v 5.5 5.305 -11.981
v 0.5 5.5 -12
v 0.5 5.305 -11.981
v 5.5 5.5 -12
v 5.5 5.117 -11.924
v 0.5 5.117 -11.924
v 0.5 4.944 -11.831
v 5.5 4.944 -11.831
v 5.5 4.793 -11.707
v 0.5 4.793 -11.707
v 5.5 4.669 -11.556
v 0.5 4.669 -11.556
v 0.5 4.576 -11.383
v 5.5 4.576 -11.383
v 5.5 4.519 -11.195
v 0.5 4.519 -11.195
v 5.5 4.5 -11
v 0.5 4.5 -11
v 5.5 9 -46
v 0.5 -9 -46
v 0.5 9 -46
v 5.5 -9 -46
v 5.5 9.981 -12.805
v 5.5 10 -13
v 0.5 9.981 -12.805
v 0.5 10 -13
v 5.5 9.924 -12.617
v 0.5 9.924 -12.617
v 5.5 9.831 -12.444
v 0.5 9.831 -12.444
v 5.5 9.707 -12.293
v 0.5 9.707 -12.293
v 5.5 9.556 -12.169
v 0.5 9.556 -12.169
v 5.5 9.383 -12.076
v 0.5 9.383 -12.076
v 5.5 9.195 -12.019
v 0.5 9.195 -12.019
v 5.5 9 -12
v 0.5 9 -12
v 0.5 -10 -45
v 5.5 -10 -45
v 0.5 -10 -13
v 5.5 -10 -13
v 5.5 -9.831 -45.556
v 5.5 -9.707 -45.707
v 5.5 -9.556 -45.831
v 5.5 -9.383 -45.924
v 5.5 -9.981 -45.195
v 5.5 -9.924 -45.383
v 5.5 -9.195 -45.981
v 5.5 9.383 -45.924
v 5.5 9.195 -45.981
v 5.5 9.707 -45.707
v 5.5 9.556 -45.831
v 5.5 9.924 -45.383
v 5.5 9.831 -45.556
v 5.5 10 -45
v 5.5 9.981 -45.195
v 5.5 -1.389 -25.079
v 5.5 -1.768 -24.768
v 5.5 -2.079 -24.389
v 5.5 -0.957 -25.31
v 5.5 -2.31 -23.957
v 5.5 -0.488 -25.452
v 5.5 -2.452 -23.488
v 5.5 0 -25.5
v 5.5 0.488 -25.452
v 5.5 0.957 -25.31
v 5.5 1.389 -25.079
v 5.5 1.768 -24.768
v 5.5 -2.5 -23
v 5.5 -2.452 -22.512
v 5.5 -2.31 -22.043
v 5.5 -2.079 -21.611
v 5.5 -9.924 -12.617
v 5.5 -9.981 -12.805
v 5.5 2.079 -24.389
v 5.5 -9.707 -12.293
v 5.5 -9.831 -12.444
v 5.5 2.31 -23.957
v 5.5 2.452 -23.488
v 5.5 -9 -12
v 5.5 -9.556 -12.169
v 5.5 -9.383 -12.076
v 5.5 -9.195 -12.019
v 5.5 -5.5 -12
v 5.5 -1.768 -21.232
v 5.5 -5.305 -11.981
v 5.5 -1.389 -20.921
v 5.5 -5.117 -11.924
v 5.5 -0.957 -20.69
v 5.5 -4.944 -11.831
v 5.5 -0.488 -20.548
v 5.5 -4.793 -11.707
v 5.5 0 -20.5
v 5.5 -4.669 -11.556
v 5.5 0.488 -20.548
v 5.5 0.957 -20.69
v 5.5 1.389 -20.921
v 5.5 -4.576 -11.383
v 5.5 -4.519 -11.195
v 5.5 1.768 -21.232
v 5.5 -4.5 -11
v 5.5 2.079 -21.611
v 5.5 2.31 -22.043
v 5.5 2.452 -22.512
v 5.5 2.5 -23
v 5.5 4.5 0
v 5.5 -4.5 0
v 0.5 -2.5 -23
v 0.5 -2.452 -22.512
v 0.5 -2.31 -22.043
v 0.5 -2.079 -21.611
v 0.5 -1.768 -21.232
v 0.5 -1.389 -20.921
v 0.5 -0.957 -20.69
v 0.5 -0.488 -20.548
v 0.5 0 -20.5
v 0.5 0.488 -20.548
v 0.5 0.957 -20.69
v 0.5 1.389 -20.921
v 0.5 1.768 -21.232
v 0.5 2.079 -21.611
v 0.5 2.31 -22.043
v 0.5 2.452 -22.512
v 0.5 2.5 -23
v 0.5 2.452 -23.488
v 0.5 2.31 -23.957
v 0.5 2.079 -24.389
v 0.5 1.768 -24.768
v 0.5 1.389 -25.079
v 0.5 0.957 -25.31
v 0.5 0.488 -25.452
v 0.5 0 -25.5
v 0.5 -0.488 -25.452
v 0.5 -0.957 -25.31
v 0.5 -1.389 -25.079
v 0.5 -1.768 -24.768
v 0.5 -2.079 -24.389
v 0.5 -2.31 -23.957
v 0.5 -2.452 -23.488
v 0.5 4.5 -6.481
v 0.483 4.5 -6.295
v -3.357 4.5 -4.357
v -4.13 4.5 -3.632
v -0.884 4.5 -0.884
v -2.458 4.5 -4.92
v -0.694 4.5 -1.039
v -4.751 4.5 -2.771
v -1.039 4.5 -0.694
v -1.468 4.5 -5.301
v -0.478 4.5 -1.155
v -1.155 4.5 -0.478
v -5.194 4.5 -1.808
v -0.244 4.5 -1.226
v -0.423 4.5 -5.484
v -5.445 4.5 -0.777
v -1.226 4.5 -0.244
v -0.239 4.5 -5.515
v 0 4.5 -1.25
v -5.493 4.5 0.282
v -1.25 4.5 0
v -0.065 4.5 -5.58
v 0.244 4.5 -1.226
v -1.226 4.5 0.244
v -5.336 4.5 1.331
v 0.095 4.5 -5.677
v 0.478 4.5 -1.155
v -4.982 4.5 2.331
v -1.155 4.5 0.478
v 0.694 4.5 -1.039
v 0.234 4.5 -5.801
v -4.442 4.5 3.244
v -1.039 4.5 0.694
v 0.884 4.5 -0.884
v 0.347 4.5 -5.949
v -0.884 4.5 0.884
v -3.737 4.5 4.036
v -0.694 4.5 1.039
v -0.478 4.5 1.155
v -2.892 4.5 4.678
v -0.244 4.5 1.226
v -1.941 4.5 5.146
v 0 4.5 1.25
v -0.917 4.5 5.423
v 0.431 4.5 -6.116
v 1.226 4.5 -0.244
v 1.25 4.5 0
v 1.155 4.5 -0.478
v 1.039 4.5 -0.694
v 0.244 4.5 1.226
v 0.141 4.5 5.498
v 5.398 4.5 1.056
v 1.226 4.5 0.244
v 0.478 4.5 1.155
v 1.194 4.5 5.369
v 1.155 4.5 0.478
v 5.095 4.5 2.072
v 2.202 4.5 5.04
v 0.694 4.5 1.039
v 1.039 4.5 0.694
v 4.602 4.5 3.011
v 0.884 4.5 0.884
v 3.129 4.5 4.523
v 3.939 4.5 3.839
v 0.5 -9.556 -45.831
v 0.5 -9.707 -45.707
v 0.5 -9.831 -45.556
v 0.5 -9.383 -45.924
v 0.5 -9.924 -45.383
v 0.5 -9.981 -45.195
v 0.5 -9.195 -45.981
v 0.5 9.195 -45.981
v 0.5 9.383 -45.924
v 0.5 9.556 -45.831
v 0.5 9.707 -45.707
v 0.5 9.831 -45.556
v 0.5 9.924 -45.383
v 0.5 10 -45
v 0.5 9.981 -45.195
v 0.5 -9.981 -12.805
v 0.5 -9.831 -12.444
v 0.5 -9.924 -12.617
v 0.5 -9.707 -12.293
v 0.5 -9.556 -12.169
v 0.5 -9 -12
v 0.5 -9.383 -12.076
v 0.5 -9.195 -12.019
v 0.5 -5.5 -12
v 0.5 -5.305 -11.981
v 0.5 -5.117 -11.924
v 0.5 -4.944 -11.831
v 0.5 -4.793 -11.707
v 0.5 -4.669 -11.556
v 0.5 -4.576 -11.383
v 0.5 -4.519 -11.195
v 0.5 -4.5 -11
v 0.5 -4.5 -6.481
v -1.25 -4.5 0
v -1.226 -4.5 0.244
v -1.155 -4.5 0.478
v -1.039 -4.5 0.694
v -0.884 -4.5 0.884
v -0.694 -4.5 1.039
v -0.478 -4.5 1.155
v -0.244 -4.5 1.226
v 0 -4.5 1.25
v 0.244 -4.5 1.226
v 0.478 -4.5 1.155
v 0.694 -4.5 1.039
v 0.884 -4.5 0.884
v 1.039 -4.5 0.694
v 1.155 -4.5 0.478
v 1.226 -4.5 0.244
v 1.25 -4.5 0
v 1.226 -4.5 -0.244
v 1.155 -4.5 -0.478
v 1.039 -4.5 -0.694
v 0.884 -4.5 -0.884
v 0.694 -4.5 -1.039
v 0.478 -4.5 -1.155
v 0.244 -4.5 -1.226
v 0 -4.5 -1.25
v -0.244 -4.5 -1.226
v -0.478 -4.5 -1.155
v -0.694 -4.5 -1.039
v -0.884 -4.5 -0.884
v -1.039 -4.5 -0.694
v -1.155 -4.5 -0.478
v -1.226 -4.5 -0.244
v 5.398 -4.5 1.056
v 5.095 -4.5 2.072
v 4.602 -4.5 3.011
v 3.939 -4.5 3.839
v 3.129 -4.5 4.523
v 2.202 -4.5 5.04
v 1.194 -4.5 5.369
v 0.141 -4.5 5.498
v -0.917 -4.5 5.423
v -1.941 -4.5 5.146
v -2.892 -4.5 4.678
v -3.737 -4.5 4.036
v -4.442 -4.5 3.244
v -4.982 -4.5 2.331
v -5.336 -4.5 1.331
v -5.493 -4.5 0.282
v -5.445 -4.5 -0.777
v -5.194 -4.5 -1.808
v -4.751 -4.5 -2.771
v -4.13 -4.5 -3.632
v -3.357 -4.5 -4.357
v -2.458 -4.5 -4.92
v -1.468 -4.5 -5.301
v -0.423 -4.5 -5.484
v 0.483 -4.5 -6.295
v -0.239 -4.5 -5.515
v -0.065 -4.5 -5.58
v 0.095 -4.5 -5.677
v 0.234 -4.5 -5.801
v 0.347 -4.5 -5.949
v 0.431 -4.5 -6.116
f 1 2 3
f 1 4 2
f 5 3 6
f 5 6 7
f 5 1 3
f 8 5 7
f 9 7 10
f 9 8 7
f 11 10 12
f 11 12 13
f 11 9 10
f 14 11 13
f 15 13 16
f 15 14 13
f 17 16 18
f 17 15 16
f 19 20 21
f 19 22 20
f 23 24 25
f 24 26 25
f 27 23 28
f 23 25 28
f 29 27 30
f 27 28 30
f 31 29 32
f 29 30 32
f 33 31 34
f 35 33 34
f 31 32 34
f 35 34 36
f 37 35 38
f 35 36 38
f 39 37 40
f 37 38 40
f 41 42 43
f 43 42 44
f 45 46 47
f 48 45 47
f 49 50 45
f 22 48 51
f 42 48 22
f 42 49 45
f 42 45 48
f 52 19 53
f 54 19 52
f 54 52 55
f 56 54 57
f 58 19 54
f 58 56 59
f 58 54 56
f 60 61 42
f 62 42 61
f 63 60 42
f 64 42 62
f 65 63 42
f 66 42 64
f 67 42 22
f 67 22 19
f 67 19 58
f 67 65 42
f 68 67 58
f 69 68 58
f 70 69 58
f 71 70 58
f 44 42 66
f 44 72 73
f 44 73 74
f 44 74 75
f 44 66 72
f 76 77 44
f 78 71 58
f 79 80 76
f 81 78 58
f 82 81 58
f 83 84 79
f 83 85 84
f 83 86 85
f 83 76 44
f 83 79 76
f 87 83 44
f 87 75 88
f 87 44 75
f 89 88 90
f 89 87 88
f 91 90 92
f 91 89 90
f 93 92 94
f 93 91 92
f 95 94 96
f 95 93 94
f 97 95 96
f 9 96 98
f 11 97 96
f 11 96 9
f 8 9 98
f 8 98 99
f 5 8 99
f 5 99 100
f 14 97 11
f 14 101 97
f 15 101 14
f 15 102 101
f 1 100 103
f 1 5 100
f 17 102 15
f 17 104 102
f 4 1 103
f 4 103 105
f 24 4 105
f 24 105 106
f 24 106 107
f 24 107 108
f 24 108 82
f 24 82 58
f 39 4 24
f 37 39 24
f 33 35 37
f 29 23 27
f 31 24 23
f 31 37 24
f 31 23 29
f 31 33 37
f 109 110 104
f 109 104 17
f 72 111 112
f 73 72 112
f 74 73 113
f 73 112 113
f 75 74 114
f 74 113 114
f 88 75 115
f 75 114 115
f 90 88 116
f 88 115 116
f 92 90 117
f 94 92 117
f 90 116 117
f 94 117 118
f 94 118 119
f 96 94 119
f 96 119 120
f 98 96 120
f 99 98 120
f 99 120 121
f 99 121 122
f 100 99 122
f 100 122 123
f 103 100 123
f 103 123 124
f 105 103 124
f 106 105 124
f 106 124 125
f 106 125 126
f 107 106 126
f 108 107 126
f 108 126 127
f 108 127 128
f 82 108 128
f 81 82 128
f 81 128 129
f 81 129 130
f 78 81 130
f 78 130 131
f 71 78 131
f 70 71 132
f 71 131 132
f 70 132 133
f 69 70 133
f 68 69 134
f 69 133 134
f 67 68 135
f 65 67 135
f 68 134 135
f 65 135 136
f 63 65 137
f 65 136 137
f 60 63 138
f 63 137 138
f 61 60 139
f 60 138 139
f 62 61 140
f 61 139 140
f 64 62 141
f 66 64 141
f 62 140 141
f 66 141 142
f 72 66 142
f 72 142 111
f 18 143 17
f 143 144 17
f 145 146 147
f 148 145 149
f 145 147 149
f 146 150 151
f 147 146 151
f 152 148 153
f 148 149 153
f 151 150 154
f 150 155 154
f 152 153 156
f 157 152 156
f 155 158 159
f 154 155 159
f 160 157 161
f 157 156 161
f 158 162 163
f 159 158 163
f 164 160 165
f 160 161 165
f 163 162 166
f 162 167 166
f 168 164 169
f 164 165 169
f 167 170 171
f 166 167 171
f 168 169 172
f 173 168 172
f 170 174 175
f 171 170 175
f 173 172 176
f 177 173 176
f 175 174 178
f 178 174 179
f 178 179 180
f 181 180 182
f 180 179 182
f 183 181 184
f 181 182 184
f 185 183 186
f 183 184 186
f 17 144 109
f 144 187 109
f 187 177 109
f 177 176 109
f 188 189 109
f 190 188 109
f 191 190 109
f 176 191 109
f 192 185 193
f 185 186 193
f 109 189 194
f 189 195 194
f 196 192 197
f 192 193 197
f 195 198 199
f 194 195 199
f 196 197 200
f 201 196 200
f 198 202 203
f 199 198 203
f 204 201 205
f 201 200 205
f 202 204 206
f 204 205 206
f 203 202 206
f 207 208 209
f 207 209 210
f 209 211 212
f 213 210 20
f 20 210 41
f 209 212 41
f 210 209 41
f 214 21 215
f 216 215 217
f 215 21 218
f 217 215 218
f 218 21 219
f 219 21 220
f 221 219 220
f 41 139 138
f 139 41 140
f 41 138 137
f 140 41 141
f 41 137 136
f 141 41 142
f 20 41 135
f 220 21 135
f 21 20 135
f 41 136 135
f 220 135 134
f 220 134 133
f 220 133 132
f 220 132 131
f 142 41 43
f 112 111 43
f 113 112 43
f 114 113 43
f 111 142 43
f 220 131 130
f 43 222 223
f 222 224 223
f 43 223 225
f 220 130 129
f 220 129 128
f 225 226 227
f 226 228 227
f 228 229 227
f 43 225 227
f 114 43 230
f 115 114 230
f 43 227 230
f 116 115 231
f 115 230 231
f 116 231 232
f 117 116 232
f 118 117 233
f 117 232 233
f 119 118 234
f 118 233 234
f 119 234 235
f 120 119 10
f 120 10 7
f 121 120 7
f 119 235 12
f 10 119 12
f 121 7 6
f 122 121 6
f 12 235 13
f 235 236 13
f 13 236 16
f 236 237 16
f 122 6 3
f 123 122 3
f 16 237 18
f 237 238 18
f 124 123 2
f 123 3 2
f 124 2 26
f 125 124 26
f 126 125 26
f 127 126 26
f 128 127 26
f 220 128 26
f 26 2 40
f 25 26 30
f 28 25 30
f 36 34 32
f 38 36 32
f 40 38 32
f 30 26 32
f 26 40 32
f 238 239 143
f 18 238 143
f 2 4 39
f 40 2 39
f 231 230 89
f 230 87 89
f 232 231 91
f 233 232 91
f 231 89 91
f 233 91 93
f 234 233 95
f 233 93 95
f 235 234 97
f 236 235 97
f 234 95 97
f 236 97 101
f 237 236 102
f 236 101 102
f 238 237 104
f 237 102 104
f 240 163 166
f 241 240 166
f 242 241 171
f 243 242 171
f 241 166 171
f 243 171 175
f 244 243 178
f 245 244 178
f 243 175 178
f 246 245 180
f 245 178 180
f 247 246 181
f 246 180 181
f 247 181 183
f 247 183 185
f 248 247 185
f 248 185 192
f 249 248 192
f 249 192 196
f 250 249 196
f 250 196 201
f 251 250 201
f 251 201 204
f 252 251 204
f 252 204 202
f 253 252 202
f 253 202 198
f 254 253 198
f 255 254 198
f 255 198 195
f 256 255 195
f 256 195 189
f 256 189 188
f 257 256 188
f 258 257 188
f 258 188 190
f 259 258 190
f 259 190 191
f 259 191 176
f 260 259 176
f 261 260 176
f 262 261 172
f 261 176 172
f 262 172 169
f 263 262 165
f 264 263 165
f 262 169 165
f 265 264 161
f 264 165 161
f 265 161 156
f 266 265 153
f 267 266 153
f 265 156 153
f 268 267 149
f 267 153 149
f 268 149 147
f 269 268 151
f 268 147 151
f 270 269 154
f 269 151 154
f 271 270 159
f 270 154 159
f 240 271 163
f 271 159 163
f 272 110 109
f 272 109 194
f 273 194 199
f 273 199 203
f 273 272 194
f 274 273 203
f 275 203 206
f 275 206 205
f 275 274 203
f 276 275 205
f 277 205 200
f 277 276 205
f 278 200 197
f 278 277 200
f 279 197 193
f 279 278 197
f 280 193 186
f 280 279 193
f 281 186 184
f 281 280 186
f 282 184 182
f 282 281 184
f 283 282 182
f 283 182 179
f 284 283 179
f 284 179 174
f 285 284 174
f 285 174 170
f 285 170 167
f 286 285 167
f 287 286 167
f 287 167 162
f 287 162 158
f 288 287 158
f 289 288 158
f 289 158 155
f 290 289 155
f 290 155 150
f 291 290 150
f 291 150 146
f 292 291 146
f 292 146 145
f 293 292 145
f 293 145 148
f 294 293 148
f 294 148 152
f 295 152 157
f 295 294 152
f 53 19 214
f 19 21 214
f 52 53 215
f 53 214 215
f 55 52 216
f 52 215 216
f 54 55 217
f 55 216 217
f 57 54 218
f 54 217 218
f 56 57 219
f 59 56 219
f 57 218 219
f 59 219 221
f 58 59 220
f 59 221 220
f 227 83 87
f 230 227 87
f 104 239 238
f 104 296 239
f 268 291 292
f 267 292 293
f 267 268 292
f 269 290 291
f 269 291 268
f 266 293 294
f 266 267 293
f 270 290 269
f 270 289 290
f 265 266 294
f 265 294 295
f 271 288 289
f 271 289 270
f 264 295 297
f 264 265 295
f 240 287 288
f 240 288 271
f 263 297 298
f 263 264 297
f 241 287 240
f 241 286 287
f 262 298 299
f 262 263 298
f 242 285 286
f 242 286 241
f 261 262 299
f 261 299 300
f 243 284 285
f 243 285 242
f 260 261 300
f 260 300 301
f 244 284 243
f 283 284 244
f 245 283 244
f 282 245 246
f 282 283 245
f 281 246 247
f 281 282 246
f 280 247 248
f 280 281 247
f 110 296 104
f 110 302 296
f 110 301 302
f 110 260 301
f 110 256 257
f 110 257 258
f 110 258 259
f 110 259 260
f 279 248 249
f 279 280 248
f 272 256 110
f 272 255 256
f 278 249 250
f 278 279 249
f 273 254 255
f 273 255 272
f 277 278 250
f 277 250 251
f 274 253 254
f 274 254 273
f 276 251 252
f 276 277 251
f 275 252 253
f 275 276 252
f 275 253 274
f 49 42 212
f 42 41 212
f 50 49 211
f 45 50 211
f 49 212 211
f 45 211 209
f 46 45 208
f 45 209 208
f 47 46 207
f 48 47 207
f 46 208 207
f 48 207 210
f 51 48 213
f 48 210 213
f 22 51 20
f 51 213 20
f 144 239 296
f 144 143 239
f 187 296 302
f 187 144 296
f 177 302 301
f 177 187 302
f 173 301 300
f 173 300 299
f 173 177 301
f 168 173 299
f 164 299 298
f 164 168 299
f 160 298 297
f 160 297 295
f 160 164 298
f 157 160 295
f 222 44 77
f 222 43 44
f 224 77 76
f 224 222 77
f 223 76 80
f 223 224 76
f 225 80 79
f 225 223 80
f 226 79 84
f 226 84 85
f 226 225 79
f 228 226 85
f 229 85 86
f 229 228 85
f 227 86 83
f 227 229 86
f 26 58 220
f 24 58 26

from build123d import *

# Parameters (mm, degrees)
F0_R     = 5.5
F1_DEPTH = 4.5
F3_DEPTH = 9
F4_W     = 20
F4_H     = 34
F5_DEPTH = 5
F7_D     = 2.5
F9_D     = 5
F10_R    = 1


with BuildPart() as f1:
    # F0 (on Front) → F1 (new body, symmetric)
    with BuildSketch(Plane.XZ):
        Circle(F0_R)
    extrude(amount=F1_DEPTH, both=True)

    # F2 (on face) → F3 (join, through all)
    with BuildSketch(Plane.XZ.offset(4.5)):
        with BuildLine():
            Line((5.5, -46), (5.5, 0))
            ThreePointArc((5.5, 0), (4.0620192023, -3.7080992435), (0.5, -5.4772255751))
            Line((0.5, -5.4772255751), (0.5, -46))
            Line((0.5, -46), (5.5, -46))
        make_face()
    extrude(amount=-F3_DEPTH)

    # F4 (on face) → F5 (join, through all)
    with BuildSketch(Plane.YZ.offset(5.5)):
        with Locations((0, -29)):
            Rectangle(F4_W, F4_H)
    extrude(amount=-F5_DEPTH)

    # F7 (through all)
    with Locations(Plane.XZ.offset(4.5)):
        with Locations((0, 0)):
            Hole(F7_D / 2)

    # F9 (through all)
    with Locations(Plane.YZ.offset(5.5)):
        with Locations((0, -23)):
            Hole(F9_D / 2)

    # F10
    f10_edges = [f1.edges().sort_by_distance(p)[0] for p in [
        (0.5, 0, -5.477226),
        (3, -4.5, -12),
        (3, 4.5, -12),
        (3, 10, -12),
        (3, -10, -12),
        (3, -10, -46),
        (3, 10, -46),
    ]]
    fillet(f10_edges, radius=F10_R)


solid = f1.part
